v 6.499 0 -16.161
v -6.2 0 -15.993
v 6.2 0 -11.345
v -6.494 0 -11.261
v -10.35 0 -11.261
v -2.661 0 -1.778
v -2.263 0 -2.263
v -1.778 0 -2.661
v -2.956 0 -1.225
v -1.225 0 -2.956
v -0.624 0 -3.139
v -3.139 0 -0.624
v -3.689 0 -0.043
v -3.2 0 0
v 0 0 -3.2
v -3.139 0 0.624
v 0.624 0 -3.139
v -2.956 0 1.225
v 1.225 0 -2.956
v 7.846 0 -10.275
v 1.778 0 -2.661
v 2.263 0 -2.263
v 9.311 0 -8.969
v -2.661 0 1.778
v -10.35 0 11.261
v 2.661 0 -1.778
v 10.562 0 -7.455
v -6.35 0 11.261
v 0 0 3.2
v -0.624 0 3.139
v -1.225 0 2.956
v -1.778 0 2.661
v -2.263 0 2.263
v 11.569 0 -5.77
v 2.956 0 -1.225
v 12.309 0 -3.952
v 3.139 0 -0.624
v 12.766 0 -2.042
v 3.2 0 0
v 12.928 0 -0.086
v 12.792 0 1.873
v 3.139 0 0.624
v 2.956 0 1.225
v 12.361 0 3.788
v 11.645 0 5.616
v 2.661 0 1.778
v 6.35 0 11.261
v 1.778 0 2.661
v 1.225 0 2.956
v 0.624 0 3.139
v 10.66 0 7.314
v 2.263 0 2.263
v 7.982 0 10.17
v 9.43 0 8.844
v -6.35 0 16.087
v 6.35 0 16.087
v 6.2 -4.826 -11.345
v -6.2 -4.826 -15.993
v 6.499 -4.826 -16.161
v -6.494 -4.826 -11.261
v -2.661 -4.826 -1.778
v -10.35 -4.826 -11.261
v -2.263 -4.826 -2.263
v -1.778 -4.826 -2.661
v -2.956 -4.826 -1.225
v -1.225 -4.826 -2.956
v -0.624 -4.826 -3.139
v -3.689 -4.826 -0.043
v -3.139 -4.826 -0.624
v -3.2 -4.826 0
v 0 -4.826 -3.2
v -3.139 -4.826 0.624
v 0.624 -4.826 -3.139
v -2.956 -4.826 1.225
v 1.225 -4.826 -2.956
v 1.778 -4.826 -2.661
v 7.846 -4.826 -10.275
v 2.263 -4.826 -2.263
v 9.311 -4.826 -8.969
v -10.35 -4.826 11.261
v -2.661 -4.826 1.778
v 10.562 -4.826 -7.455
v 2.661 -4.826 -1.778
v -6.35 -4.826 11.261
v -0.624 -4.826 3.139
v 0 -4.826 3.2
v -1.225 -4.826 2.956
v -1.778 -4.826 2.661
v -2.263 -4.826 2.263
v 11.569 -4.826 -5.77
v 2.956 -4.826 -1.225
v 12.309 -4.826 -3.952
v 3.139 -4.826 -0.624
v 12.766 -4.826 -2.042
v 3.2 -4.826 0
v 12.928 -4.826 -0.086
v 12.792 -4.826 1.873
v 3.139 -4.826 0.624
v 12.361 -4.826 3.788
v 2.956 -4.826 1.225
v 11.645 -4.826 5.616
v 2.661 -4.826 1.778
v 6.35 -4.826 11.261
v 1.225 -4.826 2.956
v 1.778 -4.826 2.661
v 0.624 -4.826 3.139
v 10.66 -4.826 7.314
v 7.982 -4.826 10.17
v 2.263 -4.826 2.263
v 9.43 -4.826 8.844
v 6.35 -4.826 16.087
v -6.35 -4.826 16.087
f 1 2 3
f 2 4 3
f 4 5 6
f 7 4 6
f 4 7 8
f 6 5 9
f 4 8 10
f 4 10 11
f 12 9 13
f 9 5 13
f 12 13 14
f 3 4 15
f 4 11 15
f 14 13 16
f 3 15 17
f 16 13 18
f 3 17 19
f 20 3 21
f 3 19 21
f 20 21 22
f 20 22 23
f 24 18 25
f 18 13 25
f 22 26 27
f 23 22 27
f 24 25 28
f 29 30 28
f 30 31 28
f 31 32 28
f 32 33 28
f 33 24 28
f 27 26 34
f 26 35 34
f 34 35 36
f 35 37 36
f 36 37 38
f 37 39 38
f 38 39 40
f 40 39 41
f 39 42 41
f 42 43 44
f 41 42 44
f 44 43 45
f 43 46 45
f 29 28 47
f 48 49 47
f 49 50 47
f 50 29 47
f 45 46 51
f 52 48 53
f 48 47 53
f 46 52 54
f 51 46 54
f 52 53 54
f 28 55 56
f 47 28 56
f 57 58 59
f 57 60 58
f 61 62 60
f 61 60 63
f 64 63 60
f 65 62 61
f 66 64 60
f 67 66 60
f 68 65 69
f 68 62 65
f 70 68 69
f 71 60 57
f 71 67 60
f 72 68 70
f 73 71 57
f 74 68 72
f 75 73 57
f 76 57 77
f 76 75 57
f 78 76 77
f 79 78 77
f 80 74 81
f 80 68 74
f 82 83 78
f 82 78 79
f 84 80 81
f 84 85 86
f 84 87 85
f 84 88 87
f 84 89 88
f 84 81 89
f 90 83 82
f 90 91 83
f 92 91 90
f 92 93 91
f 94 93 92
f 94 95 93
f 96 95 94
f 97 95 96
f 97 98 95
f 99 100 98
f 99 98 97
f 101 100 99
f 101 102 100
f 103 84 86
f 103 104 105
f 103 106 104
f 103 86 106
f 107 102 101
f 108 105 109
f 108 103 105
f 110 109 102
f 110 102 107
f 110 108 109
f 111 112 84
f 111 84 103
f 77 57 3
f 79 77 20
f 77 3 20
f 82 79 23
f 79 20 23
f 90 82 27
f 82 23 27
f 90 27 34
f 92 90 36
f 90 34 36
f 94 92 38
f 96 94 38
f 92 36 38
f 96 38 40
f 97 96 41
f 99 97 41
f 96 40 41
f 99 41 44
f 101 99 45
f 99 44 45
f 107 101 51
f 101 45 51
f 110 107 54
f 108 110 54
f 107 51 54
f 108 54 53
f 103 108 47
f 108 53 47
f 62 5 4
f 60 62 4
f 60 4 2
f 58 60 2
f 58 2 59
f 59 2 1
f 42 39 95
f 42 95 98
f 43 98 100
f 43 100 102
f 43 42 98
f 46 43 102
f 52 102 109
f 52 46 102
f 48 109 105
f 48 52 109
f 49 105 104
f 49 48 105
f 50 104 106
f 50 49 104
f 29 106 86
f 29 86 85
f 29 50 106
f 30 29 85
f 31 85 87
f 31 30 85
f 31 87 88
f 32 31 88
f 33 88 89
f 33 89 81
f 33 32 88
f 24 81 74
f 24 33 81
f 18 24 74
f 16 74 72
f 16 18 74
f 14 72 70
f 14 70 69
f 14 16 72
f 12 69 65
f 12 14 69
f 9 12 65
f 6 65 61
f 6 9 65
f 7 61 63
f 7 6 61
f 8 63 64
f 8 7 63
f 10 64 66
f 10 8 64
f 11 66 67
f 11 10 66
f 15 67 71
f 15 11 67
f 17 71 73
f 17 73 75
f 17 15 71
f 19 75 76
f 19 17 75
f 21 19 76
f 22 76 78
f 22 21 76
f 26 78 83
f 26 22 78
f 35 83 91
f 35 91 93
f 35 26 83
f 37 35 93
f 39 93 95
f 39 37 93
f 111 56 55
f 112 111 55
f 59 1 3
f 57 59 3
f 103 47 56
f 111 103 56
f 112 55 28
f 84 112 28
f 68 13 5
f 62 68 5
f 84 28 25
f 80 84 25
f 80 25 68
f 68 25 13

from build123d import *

# Parameters (mm, degrees)
F0_R     = 3.2
F1_DEPTH = 4.826


with BuildPart() as f1:
    # F0 (on Front) → F1 (new body)
    with BuildSketch(Plane.XZ):
        with BuildLine():
            Line((-6.199785, -15.992633), (6.499093, -16.161406))
            Line((6.499093, -16.161406), (6.199785, -11.344696))
            ThreePointArc((6.199785, -11.344696), (12.927958, -0.085905), (6.35, 11.261304))
            Line((6.35, 11.261304), (6.35, 16.087304))
            Line((6.35, 16.087304), (-6.35, 16.087304))
            Line((-6.35, 16.087304), (-6.35, 11.261304))
            Line((-6.35, 11.261304), (-10.35, 11.261304))
            Line((-10.35, 11.261304), (-3.688663, -0.043395))
            Line((-3.688663, -0.043395), (-10.35, -11.261304))
            Line((-10.35, -11.261304), (-6.493788, -11.261304))
            Line((-6.493788, -11.261304), (-6.199785, -15.992633))
        make_face()
        Circle(F0_R, mode=Mode.SUBTRACT)
    extrude(amount=F1_DEPTH)


solid = f1.part
